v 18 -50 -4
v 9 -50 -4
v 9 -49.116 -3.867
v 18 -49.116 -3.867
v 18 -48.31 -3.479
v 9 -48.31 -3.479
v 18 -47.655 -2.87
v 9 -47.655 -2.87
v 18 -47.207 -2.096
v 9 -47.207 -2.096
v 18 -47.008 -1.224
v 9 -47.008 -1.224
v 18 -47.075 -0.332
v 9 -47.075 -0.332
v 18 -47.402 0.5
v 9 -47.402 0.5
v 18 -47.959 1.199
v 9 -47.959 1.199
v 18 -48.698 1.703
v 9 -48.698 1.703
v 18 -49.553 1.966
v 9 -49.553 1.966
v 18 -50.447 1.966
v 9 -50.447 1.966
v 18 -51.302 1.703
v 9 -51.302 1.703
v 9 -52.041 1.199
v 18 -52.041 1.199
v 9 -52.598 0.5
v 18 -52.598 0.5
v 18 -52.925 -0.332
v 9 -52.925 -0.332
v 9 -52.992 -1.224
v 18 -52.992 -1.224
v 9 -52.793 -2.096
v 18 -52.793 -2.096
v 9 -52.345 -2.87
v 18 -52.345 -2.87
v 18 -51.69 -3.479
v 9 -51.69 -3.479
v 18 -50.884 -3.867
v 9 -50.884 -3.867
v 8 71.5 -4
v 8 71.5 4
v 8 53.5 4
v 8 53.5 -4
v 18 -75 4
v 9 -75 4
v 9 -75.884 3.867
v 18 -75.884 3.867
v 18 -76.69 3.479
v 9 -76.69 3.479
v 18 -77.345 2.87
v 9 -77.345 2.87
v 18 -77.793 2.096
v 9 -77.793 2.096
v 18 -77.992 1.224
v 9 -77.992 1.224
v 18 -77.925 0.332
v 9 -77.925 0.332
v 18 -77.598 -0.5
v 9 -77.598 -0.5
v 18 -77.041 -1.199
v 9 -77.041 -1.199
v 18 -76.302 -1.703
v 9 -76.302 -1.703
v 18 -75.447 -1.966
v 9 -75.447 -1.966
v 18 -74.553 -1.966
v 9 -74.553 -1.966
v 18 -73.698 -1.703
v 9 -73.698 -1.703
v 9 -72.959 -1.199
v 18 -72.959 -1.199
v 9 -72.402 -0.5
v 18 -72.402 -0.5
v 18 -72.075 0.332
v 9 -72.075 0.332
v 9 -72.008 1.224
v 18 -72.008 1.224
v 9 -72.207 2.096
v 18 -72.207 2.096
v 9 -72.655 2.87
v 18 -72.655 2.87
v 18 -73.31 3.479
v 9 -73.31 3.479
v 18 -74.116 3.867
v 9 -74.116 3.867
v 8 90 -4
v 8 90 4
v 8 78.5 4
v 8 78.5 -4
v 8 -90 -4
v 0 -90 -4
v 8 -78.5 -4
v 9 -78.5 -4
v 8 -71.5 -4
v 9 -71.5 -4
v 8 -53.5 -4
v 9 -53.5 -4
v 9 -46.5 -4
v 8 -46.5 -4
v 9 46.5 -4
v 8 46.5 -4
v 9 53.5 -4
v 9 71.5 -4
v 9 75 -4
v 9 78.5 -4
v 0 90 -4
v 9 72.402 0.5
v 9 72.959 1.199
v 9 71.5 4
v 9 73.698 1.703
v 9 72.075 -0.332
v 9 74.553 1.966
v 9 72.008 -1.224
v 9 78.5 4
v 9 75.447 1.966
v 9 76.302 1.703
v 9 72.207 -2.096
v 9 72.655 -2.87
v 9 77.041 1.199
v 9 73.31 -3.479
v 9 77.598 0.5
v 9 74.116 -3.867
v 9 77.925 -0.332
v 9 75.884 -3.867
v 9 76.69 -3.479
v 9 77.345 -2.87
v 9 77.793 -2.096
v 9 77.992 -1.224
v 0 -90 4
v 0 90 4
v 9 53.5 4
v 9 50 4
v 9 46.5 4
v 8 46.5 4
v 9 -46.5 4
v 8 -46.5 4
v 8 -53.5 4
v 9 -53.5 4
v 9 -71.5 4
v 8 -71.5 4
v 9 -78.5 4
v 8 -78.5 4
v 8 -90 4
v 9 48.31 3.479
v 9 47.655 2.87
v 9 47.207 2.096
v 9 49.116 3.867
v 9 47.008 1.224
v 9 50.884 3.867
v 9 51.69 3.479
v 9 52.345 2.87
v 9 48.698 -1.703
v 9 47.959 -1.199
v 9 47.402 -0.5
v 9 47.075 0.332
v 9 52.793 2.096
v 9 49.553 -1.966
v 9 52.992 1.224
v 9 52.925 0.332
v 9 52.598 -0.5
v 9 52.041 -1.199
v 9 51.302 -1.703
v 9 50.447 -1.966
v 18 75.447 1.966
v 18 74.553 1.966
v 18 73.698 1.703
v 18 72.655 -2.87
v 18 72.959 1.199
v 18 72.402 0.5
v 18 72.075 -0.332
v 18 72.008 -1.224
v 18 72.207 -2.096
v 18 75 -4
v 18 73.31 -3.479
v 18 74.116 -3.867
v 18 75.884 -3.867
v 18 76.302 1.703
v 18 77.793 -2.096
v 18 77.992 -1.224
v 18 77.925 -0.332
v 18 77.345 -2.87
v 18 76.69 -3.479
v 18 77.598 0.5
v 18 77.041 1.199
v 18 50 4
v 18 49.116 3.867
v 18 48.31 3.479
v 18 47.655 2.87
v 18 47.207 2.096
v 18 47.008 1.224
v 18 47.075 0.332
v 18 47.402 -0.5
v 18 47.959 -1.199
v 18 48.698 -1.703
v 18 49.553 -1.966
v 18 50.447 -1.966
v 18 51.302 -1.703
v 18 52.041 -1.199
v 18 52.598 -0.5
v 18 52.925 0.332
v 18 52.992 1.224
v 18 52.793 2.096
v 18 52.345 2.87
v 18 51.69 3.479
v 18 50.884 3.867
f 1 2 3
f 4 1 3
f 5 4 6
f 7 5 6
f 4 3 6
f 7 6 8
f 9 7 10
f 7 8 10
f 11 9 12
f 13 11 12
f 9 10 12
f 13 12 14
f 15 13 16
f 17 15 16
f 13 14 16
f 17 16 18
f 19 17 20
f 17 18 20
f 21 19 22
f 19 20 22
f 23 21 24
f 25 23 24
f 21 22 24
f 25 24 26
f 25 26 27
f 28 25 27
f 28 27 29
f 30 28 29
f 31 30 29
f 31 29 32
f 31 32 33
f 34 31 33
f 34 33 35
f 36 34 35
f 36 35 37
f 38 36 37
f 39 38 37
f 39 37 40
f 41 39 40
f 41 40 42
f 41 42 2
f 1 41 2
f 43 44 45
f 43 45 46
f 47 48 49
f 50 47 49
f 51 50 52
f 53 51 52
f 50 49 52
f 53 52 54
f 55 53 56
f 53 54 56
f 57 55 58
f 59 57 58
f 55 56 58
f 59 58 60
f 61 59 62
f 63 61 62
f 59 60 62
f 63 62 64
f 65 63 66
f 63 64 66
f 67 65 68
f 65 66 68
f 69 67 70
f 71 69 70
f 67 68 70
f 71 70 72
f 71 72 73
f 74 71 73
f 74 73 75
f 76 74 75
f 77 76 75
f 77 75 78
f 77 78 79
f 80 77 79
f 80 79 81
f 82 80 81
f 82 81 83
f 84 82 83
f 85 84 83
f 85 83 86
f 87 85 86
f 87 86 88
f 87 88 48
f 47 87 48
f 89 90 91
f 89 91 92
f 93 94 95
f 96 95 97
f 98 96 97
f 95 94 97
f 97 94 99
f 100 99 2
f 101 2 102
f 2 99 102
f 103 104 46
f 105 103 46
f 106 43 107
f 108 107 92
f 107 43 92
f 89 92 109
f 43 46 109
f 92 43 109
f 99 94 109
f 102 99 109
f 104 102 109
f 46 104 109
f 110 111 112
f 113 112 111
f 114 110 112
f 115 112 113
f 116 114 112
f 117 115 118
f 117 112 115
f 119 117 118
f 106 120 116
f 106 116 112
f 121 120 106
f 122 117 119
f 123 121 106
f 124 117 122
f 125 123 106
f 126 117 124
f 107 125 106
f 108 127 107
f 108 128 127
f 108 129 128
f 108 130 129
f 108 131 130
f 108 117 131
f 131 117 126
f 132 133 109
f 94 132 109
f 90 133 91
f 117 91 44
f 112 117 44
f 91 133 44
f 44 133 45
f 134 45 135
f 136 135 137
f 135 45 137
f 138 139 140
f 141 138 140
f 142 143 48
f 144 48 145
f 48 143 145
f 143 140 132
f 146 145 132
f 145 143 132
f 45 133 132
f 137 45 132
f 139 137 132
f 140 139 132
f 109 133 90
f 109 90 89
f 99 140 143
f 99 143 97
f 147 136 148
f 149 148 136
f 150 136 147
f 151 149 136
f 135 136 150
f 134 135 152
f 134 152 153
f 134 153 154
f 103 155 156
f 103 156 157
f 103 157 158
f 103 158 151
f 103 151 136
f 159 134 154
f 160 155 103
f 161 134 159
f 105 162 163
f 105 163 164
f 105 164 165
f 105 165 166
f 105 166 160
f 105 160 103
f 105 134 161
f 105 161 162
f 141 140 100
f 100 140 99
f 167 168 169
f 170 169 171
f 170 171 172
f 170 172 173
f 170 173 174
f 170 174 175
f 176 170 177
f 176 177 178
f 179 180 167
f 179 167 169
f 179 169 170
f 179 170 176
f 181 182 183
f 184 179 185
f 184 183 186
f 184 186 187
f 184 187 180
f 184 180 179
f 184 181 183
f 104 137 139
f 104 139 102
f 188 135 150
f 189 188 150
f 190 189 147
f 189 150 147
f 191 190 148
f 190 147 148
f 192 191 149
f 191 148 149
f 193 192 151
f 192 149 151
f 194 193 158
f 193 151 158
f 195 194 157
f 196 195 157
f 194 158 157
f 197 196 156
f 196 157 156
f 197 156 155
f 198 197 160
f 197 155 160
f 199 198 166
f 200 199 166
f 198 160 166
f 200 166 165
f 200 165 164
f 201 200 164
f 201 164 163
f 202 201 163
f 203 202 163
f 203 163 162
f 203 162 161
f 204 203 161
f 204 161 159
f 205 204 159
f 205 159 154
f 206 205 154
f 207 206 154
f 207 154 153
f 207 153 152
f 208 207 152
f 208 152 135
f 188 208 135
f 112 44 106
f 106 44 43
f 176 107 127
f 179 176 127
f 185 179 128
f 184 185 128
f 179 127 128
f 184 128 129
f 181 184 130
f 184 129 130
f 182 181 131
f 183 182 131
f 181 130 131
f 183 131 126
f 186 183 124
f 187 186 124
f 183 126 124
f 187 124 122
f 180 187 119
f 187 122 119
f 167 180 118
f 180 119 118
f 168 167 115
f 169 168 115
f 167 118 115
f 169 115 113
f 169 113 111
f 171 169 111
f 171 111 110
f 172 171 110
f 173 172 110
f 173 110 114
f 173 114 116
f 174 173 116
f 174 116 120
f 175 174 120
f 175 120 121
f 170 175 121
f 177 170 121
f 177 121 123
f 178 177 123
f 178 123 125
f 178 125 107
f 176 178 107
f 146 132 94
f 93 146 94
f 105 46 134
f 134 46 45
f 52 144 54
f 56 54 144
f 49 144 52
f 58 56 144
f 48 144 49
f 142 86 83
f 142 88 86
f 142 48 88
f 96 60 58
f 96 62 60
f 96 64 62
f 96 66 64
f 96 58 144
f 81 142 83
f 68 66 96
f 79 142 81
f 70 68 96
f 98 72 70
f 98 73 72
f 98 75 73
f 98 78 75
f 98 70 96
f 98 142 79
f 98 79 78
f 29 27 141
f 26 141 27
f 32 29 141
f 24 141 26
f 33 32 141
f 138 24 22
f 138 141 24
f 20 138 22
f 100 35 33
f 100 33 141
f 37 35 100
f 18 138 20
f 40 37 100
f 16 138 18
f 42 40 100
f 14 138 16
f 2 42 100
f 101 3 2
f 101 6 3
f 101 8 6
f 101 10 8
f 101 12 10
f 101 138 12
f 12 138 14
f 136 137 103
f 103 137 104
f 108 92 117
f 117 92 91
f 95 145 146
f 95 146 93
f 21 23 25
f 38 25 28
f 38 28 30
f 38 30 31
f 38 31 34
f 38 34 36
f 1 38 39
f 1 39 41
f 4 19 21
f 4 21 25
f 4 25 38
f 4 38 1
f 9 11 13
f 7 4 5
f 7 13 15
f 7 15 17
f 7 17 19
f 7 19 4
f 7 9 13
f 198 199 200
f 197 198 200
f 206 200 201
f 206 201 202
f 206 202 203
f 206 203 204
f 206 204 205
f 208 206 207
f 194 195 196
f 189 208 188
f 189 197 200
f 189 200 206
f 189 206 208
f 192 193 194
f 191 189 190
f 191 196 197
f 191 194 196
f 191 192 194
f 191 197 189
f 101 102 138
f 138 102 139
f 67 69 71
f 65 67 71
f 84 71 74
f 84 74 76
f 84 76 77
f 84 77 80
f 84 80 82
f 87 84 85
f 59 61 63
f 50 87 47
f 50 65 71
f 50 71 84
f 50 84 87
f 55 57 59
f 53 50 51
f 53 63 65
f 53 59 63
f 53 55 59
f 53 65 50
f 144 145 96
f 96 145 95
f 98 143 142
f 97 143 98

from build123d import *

# Parameters (mm, degrees)
SKETCH1_W           = 8
SKETCH1_H           = 180
BOSS_EXTRUDE1_DEPTH = 8
SKETCH3_R           = 3
BOSS_EXTRUDE4_DEPTH = 10
SKETCH3_4_W         = 8
SKETCH3_4_H         = 7
SKETCH3_4_R         = 3
BOSS_EXTRUDE5_DEPTH = 1


with BuildPart() as part:
    # Sketch1 → Boss-Extrude1 (new body)
    with BuildSketch(Plane(origin=(0, 0, 0), x_dir=(0, 0, -1), z_dir=(1, 0, 0))):
        Rectangle(SKETCH1_W, SKETCH1_H)
    extrude(amount=BOSS_EXTRUDE1_DEPTH)

    # Sketch3 → Boss-Extrude4 (add)
    with BuildSketch(Plane(origin=(8, 0, 0), x_dir=(0, 0, -1), z_dir=(1, 0, 0))):
        with Locations((1, 75)):
            Circle(SKETCH3_R)
        with Locations((-1, 50)):
            Circle(SKETCH3_R)
        with Locations((1, -50)):
            Circle(SKETCH3_R)
        with Locations((-1, -75)):
            Circle(SKETCH3_R)
    extrude(amount=BOSS_EXTRUDE4_DEPTH)

    # Sketch3<4> → Boss-Extrude5 (add)
    # profile 1 of 4: a face of its own
    with BuildSketch(Plane(origin=(8, 0, 0), x_dir=(0, 0, -1), z_dir=(1, 0, 0))):
        with Locations((0, 75)):
            Rectangle(SKETCH3_4_W, SKETCH3_4_H)
    # profile 2 of 4: a face of its own
    with BuildSketch(Plane(origin=(8, 0, 0), x_dir=(0, 0, -1), z_dir=(1, 0, 0))):
        with Locations((0, 50)):
            Rectangle(SKETCH3_4_W, SKETCH3_4_H)
    # profile 3 of 4: a face of its own
    with BuildSketch(Plane(origin=(8, 0, 0), x_dir=(0, 0, -1), z_dir=(1, 0, 0))):
        with Locations((0, -50)):
            Rectangle(SKETCH3_4_W, SKETCH3_4_H)
    # profile 4 of 4: a face of its own
    with BuildSketch(Plane(origin=(8, 0, 0), x_dir=(0, 0, -1), z_dir=(1, 0, 0))):
        Polygon((4, -71.5), (-4, -71.5), (-4, -74.999999954), (-4, -78.5), (4, -78.5), align=None)
        with Locations((-1, -75)):
            Circle(SKETCH3_4_R, mode=Mode.SUBTRACT)
    extrude(amount=BOSS_EXTRUDE5_DEPTH)


solid = part.part
